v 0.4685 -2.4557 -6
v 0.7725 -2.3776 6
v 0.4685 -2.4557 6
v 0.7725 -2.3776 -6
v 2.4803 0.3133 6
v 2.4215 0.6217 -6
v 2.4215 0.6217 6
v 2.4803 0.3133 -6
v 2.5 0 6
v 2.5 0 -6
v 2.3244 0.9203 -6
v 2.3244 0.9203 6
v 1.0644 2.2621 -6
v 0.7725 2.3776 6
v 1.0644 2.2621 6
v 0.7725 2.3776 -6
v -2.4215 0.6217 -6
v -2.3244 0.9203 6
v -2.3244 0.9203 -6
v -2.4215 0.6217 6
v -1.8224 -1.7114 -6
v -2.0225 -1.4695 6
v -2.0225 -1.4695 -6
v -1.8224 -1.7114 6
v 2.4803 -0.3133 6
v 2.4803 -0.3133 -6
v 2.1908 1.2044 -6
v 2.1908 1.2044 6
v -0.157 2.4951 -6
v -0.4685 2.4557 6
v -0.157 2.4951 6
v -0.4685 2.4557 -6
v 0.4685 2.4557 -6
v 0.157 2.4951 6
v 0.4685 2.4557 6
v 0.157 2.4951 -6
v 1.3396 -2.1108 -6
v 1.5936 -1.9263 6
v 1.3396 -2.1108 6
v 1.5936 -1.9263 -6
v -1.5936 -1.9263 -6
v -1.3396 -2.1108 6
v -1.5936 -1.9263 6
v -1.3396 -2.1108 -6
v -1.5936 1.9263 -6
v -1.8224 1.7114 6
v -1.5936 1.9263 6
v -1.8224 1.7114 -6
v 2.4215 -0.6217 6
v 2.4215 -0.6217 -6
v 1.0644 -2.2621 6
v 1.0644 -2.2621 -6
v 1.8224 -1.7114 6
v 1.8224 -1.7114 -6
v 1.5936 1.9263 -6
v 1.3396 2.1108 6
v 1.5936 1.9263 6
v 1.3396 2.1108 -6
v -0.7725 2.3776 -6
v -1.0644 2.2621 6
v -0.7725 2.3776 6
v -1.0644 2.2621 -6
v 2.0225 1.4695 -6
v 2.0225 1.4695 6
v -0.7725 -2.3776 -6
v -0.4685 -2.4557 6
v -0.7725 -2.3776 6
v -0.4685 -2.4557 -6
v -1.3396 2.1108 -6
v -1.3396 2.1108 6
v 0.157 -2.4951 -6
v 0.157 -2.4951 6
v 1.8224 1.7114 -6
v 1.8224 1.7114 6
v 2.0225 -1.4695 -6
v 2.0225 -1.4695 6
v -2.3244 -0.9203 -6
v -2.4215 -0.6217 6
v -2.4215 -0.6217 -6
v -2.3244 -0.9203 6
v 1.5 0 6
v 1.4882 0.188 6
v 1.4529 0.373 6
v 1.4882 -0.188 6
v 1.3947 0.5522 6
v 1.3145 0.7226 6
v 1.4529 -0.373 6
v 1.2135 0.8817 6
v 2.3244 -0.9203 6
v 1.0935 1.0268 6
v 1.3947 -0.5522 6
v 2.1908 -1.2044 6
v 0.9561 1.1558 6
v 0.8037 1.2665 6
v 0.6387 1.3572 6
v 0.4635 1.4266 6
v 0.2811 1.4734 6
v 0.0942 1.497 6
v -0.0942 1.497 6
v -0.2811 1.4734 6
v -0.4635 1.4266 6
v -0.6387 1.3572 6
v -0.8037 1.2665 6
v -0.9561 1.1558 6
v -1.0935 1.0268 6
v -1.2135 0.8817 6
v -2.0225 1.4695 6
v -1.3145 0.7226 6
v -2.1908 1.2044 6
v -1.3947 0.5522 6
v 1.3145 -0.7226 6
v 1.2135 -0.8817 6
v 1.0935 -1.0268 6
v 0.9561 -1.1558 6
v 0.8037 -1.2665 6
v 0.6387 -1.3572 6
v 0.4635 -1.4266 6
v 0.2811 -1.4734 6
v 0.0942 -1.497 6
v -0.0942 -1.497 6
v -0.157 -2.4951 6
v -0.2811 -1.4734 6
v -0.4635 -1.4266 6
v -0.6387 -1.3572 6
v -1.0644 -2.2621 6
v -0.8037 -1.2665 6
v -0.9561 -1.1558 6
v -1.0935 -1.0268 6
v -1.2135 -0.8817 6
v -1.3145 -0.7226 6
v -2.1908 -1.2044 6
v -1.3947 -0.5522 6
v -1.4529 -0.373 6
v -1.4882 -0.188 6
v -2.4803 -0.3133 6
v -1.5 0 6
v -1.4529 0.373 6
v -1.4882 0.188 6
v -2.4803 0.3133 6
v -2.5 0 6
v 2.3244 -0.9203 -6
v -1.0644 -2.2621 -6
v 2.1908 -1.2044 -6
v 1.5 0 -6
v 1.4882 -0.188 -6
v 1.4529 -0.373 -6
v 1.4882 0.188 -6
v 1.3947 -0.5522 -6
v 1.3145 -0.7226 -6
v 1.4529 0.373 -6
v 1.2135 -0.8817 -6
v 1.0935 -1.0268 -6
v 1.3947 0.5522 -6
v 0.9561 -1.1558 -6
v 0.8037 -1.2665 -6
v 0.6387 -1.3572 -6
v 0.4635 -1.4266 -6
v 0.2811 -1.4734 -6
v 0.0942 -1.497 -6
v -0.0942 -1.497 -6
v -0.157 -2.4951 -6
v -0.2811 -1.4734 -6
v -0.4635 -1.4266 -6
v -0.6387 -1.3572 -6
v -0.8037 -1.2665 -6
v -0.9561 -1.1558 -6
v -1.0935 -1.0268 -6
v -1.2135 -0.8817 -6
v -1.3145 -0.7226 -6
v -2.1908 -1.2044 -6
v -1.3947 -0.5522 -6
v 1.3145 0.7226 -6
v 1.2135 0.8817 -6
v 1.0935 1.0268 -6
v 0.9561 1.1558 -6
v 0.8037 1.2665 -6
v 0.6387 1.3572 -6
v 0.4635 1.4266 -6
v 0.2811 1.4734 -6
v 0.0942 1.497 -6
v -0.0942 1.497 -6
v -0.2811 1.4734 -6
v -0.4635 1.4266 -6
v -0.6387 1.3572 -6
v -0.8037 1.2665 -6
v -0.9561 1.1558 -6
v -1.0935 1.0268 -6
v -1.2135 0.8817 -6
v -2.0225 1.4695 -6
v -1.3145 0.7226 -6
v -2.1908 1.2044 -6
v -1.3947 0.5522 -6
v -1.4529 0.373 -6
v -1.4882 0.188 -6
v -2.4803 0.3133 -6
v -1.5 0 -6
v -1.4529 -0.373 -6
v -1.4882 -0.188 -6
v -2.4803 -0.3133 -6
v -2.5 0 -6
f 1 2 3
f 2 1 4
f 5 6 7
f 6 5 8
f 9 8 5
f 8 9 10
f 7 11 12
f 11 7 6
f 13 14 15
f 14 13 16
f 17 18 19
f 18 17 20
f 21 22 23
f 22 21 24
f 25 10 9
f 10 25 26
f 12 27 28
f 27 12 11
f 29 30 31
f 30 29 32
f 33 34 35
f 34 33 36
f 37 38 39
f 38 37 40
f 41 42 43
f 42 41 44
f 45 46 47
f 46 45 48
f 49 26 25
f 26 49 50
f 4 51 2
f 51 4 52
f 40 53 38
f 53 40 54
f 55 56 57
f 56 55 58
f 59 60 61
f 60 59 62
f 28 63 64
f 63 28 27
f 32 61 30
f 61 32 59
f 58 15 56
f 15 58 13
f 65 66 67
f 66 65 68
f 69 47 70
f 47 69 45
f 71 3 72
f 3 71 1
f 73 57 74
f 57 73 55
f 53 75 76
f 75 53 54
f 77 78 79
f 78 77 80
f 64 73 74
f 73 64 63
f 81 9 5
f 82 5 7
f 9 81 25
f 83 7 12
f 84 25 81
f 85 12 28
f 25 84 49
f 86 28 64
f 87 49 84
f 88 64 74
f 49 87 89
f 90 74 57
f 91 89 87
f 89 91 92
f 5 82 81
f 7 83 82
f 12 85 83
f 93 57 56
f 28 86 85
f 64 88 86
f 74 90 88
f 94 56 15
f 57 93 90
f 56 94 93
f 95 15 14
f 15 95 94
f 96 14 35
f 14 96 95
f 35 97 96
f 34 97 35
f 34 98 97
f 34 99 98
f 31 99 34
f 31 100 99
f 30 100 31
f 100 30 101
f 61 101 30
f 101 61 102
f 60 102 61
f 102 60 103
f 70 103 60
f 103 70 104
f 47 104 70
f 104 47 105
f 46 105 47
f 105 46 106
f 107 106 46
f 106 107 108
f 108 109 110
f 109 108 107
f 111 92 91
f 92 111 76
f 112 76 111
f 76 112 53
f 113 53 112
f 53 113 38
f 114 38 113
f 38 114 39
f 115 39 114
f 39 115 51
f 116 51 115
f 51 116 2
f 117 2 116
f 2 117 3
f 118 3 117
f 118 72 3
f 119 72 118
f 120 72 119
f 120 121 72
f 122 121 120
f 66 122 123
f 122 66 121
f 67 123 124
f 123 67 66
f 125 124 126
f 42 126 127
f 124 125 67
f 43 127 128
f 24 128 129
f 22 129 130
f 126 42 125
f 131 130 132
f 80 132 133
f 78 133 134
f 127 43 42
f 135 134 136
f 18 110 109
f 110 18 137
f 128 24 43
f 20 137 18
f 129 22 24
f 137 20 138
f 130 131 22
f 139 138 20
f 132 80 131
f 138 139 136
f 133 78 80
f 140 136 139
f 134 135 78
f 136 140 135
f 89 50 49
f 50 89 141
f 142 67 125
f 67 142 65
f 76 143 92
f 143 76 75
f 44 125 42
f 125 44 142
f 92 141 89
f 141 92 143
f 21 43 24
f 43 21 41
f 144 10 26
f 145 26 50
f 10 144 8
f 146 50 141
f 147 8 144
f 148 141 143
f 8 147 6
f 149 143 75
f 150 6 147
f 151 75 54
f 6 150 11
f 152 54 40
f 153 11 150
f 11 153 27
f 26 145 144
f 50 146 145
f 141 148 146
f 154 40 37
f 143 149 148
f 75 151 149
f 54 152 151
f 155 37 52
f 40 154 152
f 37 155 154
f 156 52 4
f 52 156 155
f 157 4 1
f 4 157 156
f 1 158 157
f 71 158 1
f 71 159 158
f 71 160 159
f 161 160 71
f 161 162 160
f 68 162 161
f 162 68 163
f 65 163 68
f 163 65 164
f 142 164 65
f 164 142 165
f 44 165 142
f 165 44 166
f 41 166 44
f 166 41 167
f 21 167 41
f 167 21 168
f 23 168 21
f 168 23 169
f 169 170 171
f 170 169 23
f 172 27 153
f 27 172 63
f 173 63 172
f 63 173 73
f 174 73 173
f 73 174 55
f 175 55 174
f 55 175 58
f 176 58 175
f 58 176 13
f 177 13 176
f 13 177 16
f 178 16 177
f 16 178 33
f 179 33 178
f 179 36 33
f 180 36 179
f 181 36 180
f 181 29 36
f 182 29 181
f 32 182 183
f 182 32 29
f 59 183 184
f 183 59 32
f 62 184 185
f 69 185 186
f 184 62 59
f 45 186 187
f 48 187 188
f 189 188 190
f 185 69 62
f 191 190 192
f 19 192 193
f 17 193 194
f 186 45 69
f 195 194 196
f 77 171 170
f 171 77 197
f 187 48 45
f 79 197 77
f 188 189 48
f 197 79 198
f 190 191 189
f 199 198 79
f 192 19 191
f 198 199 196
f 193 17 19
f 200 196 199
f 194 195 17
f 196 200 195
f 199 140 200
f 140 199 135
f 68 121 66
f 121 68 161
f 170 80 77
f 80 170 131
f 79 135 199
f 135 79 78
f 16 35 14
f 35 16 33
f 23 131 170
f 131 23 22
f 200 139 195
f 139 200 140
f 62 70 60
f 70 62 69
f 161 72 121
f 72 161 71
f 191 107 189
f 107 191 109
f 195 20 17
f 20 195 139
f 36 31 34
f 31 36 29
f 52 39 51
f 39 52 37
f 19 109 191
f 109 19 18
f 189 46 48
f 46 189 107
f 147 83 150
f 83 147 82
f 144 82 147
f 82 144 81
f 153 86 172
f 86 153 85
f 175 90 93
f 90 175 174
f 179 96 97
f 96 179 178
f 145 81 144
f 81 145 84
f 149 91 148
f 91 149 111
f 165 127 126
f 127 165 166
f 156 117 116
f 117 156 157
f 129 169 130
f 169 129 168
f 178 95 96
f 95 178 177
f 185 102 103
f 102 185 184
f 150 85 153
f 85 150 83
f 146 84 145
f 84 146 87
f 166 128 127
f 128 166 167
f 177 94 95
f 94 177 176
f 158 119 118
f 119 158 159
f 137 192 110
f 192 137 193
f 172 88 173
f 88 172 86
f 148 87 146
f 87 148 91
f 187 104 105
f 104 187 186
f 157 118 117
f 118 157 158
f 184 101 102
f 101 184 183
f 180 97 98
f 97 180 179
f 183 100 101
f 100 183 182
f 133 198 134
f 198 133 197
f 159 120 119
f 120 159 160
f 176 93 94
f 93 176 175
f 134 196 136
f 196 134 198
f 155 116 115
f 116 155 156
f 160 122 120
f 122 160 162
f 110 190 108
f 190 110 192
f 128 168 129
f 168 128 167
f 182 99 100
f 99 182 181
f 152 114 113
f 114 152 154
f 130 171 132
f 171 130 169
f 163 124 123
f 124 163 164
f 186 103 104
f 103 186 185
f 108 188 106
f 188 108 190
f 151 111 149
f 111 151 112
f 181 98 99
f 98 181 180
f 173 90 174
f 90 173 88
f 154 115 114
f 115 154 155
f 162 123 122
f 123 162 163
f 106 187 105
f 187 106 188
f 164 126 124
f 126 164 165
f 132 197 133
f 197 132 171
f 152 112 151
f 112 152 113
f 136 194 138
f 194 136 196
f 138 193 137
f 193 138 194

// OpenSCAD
$fn = 50;


difference() {
	union() {
		translate(v = [0, 0, -6.0000000000]) {
			cylinder(h = 12, r = 2.5000000000);
		}
	}
	union() {
		translate(v = [0, 0, -100.0000000000]) {
			cylinder(h = 200, r = 1.5000000000);
		}
	}
}
